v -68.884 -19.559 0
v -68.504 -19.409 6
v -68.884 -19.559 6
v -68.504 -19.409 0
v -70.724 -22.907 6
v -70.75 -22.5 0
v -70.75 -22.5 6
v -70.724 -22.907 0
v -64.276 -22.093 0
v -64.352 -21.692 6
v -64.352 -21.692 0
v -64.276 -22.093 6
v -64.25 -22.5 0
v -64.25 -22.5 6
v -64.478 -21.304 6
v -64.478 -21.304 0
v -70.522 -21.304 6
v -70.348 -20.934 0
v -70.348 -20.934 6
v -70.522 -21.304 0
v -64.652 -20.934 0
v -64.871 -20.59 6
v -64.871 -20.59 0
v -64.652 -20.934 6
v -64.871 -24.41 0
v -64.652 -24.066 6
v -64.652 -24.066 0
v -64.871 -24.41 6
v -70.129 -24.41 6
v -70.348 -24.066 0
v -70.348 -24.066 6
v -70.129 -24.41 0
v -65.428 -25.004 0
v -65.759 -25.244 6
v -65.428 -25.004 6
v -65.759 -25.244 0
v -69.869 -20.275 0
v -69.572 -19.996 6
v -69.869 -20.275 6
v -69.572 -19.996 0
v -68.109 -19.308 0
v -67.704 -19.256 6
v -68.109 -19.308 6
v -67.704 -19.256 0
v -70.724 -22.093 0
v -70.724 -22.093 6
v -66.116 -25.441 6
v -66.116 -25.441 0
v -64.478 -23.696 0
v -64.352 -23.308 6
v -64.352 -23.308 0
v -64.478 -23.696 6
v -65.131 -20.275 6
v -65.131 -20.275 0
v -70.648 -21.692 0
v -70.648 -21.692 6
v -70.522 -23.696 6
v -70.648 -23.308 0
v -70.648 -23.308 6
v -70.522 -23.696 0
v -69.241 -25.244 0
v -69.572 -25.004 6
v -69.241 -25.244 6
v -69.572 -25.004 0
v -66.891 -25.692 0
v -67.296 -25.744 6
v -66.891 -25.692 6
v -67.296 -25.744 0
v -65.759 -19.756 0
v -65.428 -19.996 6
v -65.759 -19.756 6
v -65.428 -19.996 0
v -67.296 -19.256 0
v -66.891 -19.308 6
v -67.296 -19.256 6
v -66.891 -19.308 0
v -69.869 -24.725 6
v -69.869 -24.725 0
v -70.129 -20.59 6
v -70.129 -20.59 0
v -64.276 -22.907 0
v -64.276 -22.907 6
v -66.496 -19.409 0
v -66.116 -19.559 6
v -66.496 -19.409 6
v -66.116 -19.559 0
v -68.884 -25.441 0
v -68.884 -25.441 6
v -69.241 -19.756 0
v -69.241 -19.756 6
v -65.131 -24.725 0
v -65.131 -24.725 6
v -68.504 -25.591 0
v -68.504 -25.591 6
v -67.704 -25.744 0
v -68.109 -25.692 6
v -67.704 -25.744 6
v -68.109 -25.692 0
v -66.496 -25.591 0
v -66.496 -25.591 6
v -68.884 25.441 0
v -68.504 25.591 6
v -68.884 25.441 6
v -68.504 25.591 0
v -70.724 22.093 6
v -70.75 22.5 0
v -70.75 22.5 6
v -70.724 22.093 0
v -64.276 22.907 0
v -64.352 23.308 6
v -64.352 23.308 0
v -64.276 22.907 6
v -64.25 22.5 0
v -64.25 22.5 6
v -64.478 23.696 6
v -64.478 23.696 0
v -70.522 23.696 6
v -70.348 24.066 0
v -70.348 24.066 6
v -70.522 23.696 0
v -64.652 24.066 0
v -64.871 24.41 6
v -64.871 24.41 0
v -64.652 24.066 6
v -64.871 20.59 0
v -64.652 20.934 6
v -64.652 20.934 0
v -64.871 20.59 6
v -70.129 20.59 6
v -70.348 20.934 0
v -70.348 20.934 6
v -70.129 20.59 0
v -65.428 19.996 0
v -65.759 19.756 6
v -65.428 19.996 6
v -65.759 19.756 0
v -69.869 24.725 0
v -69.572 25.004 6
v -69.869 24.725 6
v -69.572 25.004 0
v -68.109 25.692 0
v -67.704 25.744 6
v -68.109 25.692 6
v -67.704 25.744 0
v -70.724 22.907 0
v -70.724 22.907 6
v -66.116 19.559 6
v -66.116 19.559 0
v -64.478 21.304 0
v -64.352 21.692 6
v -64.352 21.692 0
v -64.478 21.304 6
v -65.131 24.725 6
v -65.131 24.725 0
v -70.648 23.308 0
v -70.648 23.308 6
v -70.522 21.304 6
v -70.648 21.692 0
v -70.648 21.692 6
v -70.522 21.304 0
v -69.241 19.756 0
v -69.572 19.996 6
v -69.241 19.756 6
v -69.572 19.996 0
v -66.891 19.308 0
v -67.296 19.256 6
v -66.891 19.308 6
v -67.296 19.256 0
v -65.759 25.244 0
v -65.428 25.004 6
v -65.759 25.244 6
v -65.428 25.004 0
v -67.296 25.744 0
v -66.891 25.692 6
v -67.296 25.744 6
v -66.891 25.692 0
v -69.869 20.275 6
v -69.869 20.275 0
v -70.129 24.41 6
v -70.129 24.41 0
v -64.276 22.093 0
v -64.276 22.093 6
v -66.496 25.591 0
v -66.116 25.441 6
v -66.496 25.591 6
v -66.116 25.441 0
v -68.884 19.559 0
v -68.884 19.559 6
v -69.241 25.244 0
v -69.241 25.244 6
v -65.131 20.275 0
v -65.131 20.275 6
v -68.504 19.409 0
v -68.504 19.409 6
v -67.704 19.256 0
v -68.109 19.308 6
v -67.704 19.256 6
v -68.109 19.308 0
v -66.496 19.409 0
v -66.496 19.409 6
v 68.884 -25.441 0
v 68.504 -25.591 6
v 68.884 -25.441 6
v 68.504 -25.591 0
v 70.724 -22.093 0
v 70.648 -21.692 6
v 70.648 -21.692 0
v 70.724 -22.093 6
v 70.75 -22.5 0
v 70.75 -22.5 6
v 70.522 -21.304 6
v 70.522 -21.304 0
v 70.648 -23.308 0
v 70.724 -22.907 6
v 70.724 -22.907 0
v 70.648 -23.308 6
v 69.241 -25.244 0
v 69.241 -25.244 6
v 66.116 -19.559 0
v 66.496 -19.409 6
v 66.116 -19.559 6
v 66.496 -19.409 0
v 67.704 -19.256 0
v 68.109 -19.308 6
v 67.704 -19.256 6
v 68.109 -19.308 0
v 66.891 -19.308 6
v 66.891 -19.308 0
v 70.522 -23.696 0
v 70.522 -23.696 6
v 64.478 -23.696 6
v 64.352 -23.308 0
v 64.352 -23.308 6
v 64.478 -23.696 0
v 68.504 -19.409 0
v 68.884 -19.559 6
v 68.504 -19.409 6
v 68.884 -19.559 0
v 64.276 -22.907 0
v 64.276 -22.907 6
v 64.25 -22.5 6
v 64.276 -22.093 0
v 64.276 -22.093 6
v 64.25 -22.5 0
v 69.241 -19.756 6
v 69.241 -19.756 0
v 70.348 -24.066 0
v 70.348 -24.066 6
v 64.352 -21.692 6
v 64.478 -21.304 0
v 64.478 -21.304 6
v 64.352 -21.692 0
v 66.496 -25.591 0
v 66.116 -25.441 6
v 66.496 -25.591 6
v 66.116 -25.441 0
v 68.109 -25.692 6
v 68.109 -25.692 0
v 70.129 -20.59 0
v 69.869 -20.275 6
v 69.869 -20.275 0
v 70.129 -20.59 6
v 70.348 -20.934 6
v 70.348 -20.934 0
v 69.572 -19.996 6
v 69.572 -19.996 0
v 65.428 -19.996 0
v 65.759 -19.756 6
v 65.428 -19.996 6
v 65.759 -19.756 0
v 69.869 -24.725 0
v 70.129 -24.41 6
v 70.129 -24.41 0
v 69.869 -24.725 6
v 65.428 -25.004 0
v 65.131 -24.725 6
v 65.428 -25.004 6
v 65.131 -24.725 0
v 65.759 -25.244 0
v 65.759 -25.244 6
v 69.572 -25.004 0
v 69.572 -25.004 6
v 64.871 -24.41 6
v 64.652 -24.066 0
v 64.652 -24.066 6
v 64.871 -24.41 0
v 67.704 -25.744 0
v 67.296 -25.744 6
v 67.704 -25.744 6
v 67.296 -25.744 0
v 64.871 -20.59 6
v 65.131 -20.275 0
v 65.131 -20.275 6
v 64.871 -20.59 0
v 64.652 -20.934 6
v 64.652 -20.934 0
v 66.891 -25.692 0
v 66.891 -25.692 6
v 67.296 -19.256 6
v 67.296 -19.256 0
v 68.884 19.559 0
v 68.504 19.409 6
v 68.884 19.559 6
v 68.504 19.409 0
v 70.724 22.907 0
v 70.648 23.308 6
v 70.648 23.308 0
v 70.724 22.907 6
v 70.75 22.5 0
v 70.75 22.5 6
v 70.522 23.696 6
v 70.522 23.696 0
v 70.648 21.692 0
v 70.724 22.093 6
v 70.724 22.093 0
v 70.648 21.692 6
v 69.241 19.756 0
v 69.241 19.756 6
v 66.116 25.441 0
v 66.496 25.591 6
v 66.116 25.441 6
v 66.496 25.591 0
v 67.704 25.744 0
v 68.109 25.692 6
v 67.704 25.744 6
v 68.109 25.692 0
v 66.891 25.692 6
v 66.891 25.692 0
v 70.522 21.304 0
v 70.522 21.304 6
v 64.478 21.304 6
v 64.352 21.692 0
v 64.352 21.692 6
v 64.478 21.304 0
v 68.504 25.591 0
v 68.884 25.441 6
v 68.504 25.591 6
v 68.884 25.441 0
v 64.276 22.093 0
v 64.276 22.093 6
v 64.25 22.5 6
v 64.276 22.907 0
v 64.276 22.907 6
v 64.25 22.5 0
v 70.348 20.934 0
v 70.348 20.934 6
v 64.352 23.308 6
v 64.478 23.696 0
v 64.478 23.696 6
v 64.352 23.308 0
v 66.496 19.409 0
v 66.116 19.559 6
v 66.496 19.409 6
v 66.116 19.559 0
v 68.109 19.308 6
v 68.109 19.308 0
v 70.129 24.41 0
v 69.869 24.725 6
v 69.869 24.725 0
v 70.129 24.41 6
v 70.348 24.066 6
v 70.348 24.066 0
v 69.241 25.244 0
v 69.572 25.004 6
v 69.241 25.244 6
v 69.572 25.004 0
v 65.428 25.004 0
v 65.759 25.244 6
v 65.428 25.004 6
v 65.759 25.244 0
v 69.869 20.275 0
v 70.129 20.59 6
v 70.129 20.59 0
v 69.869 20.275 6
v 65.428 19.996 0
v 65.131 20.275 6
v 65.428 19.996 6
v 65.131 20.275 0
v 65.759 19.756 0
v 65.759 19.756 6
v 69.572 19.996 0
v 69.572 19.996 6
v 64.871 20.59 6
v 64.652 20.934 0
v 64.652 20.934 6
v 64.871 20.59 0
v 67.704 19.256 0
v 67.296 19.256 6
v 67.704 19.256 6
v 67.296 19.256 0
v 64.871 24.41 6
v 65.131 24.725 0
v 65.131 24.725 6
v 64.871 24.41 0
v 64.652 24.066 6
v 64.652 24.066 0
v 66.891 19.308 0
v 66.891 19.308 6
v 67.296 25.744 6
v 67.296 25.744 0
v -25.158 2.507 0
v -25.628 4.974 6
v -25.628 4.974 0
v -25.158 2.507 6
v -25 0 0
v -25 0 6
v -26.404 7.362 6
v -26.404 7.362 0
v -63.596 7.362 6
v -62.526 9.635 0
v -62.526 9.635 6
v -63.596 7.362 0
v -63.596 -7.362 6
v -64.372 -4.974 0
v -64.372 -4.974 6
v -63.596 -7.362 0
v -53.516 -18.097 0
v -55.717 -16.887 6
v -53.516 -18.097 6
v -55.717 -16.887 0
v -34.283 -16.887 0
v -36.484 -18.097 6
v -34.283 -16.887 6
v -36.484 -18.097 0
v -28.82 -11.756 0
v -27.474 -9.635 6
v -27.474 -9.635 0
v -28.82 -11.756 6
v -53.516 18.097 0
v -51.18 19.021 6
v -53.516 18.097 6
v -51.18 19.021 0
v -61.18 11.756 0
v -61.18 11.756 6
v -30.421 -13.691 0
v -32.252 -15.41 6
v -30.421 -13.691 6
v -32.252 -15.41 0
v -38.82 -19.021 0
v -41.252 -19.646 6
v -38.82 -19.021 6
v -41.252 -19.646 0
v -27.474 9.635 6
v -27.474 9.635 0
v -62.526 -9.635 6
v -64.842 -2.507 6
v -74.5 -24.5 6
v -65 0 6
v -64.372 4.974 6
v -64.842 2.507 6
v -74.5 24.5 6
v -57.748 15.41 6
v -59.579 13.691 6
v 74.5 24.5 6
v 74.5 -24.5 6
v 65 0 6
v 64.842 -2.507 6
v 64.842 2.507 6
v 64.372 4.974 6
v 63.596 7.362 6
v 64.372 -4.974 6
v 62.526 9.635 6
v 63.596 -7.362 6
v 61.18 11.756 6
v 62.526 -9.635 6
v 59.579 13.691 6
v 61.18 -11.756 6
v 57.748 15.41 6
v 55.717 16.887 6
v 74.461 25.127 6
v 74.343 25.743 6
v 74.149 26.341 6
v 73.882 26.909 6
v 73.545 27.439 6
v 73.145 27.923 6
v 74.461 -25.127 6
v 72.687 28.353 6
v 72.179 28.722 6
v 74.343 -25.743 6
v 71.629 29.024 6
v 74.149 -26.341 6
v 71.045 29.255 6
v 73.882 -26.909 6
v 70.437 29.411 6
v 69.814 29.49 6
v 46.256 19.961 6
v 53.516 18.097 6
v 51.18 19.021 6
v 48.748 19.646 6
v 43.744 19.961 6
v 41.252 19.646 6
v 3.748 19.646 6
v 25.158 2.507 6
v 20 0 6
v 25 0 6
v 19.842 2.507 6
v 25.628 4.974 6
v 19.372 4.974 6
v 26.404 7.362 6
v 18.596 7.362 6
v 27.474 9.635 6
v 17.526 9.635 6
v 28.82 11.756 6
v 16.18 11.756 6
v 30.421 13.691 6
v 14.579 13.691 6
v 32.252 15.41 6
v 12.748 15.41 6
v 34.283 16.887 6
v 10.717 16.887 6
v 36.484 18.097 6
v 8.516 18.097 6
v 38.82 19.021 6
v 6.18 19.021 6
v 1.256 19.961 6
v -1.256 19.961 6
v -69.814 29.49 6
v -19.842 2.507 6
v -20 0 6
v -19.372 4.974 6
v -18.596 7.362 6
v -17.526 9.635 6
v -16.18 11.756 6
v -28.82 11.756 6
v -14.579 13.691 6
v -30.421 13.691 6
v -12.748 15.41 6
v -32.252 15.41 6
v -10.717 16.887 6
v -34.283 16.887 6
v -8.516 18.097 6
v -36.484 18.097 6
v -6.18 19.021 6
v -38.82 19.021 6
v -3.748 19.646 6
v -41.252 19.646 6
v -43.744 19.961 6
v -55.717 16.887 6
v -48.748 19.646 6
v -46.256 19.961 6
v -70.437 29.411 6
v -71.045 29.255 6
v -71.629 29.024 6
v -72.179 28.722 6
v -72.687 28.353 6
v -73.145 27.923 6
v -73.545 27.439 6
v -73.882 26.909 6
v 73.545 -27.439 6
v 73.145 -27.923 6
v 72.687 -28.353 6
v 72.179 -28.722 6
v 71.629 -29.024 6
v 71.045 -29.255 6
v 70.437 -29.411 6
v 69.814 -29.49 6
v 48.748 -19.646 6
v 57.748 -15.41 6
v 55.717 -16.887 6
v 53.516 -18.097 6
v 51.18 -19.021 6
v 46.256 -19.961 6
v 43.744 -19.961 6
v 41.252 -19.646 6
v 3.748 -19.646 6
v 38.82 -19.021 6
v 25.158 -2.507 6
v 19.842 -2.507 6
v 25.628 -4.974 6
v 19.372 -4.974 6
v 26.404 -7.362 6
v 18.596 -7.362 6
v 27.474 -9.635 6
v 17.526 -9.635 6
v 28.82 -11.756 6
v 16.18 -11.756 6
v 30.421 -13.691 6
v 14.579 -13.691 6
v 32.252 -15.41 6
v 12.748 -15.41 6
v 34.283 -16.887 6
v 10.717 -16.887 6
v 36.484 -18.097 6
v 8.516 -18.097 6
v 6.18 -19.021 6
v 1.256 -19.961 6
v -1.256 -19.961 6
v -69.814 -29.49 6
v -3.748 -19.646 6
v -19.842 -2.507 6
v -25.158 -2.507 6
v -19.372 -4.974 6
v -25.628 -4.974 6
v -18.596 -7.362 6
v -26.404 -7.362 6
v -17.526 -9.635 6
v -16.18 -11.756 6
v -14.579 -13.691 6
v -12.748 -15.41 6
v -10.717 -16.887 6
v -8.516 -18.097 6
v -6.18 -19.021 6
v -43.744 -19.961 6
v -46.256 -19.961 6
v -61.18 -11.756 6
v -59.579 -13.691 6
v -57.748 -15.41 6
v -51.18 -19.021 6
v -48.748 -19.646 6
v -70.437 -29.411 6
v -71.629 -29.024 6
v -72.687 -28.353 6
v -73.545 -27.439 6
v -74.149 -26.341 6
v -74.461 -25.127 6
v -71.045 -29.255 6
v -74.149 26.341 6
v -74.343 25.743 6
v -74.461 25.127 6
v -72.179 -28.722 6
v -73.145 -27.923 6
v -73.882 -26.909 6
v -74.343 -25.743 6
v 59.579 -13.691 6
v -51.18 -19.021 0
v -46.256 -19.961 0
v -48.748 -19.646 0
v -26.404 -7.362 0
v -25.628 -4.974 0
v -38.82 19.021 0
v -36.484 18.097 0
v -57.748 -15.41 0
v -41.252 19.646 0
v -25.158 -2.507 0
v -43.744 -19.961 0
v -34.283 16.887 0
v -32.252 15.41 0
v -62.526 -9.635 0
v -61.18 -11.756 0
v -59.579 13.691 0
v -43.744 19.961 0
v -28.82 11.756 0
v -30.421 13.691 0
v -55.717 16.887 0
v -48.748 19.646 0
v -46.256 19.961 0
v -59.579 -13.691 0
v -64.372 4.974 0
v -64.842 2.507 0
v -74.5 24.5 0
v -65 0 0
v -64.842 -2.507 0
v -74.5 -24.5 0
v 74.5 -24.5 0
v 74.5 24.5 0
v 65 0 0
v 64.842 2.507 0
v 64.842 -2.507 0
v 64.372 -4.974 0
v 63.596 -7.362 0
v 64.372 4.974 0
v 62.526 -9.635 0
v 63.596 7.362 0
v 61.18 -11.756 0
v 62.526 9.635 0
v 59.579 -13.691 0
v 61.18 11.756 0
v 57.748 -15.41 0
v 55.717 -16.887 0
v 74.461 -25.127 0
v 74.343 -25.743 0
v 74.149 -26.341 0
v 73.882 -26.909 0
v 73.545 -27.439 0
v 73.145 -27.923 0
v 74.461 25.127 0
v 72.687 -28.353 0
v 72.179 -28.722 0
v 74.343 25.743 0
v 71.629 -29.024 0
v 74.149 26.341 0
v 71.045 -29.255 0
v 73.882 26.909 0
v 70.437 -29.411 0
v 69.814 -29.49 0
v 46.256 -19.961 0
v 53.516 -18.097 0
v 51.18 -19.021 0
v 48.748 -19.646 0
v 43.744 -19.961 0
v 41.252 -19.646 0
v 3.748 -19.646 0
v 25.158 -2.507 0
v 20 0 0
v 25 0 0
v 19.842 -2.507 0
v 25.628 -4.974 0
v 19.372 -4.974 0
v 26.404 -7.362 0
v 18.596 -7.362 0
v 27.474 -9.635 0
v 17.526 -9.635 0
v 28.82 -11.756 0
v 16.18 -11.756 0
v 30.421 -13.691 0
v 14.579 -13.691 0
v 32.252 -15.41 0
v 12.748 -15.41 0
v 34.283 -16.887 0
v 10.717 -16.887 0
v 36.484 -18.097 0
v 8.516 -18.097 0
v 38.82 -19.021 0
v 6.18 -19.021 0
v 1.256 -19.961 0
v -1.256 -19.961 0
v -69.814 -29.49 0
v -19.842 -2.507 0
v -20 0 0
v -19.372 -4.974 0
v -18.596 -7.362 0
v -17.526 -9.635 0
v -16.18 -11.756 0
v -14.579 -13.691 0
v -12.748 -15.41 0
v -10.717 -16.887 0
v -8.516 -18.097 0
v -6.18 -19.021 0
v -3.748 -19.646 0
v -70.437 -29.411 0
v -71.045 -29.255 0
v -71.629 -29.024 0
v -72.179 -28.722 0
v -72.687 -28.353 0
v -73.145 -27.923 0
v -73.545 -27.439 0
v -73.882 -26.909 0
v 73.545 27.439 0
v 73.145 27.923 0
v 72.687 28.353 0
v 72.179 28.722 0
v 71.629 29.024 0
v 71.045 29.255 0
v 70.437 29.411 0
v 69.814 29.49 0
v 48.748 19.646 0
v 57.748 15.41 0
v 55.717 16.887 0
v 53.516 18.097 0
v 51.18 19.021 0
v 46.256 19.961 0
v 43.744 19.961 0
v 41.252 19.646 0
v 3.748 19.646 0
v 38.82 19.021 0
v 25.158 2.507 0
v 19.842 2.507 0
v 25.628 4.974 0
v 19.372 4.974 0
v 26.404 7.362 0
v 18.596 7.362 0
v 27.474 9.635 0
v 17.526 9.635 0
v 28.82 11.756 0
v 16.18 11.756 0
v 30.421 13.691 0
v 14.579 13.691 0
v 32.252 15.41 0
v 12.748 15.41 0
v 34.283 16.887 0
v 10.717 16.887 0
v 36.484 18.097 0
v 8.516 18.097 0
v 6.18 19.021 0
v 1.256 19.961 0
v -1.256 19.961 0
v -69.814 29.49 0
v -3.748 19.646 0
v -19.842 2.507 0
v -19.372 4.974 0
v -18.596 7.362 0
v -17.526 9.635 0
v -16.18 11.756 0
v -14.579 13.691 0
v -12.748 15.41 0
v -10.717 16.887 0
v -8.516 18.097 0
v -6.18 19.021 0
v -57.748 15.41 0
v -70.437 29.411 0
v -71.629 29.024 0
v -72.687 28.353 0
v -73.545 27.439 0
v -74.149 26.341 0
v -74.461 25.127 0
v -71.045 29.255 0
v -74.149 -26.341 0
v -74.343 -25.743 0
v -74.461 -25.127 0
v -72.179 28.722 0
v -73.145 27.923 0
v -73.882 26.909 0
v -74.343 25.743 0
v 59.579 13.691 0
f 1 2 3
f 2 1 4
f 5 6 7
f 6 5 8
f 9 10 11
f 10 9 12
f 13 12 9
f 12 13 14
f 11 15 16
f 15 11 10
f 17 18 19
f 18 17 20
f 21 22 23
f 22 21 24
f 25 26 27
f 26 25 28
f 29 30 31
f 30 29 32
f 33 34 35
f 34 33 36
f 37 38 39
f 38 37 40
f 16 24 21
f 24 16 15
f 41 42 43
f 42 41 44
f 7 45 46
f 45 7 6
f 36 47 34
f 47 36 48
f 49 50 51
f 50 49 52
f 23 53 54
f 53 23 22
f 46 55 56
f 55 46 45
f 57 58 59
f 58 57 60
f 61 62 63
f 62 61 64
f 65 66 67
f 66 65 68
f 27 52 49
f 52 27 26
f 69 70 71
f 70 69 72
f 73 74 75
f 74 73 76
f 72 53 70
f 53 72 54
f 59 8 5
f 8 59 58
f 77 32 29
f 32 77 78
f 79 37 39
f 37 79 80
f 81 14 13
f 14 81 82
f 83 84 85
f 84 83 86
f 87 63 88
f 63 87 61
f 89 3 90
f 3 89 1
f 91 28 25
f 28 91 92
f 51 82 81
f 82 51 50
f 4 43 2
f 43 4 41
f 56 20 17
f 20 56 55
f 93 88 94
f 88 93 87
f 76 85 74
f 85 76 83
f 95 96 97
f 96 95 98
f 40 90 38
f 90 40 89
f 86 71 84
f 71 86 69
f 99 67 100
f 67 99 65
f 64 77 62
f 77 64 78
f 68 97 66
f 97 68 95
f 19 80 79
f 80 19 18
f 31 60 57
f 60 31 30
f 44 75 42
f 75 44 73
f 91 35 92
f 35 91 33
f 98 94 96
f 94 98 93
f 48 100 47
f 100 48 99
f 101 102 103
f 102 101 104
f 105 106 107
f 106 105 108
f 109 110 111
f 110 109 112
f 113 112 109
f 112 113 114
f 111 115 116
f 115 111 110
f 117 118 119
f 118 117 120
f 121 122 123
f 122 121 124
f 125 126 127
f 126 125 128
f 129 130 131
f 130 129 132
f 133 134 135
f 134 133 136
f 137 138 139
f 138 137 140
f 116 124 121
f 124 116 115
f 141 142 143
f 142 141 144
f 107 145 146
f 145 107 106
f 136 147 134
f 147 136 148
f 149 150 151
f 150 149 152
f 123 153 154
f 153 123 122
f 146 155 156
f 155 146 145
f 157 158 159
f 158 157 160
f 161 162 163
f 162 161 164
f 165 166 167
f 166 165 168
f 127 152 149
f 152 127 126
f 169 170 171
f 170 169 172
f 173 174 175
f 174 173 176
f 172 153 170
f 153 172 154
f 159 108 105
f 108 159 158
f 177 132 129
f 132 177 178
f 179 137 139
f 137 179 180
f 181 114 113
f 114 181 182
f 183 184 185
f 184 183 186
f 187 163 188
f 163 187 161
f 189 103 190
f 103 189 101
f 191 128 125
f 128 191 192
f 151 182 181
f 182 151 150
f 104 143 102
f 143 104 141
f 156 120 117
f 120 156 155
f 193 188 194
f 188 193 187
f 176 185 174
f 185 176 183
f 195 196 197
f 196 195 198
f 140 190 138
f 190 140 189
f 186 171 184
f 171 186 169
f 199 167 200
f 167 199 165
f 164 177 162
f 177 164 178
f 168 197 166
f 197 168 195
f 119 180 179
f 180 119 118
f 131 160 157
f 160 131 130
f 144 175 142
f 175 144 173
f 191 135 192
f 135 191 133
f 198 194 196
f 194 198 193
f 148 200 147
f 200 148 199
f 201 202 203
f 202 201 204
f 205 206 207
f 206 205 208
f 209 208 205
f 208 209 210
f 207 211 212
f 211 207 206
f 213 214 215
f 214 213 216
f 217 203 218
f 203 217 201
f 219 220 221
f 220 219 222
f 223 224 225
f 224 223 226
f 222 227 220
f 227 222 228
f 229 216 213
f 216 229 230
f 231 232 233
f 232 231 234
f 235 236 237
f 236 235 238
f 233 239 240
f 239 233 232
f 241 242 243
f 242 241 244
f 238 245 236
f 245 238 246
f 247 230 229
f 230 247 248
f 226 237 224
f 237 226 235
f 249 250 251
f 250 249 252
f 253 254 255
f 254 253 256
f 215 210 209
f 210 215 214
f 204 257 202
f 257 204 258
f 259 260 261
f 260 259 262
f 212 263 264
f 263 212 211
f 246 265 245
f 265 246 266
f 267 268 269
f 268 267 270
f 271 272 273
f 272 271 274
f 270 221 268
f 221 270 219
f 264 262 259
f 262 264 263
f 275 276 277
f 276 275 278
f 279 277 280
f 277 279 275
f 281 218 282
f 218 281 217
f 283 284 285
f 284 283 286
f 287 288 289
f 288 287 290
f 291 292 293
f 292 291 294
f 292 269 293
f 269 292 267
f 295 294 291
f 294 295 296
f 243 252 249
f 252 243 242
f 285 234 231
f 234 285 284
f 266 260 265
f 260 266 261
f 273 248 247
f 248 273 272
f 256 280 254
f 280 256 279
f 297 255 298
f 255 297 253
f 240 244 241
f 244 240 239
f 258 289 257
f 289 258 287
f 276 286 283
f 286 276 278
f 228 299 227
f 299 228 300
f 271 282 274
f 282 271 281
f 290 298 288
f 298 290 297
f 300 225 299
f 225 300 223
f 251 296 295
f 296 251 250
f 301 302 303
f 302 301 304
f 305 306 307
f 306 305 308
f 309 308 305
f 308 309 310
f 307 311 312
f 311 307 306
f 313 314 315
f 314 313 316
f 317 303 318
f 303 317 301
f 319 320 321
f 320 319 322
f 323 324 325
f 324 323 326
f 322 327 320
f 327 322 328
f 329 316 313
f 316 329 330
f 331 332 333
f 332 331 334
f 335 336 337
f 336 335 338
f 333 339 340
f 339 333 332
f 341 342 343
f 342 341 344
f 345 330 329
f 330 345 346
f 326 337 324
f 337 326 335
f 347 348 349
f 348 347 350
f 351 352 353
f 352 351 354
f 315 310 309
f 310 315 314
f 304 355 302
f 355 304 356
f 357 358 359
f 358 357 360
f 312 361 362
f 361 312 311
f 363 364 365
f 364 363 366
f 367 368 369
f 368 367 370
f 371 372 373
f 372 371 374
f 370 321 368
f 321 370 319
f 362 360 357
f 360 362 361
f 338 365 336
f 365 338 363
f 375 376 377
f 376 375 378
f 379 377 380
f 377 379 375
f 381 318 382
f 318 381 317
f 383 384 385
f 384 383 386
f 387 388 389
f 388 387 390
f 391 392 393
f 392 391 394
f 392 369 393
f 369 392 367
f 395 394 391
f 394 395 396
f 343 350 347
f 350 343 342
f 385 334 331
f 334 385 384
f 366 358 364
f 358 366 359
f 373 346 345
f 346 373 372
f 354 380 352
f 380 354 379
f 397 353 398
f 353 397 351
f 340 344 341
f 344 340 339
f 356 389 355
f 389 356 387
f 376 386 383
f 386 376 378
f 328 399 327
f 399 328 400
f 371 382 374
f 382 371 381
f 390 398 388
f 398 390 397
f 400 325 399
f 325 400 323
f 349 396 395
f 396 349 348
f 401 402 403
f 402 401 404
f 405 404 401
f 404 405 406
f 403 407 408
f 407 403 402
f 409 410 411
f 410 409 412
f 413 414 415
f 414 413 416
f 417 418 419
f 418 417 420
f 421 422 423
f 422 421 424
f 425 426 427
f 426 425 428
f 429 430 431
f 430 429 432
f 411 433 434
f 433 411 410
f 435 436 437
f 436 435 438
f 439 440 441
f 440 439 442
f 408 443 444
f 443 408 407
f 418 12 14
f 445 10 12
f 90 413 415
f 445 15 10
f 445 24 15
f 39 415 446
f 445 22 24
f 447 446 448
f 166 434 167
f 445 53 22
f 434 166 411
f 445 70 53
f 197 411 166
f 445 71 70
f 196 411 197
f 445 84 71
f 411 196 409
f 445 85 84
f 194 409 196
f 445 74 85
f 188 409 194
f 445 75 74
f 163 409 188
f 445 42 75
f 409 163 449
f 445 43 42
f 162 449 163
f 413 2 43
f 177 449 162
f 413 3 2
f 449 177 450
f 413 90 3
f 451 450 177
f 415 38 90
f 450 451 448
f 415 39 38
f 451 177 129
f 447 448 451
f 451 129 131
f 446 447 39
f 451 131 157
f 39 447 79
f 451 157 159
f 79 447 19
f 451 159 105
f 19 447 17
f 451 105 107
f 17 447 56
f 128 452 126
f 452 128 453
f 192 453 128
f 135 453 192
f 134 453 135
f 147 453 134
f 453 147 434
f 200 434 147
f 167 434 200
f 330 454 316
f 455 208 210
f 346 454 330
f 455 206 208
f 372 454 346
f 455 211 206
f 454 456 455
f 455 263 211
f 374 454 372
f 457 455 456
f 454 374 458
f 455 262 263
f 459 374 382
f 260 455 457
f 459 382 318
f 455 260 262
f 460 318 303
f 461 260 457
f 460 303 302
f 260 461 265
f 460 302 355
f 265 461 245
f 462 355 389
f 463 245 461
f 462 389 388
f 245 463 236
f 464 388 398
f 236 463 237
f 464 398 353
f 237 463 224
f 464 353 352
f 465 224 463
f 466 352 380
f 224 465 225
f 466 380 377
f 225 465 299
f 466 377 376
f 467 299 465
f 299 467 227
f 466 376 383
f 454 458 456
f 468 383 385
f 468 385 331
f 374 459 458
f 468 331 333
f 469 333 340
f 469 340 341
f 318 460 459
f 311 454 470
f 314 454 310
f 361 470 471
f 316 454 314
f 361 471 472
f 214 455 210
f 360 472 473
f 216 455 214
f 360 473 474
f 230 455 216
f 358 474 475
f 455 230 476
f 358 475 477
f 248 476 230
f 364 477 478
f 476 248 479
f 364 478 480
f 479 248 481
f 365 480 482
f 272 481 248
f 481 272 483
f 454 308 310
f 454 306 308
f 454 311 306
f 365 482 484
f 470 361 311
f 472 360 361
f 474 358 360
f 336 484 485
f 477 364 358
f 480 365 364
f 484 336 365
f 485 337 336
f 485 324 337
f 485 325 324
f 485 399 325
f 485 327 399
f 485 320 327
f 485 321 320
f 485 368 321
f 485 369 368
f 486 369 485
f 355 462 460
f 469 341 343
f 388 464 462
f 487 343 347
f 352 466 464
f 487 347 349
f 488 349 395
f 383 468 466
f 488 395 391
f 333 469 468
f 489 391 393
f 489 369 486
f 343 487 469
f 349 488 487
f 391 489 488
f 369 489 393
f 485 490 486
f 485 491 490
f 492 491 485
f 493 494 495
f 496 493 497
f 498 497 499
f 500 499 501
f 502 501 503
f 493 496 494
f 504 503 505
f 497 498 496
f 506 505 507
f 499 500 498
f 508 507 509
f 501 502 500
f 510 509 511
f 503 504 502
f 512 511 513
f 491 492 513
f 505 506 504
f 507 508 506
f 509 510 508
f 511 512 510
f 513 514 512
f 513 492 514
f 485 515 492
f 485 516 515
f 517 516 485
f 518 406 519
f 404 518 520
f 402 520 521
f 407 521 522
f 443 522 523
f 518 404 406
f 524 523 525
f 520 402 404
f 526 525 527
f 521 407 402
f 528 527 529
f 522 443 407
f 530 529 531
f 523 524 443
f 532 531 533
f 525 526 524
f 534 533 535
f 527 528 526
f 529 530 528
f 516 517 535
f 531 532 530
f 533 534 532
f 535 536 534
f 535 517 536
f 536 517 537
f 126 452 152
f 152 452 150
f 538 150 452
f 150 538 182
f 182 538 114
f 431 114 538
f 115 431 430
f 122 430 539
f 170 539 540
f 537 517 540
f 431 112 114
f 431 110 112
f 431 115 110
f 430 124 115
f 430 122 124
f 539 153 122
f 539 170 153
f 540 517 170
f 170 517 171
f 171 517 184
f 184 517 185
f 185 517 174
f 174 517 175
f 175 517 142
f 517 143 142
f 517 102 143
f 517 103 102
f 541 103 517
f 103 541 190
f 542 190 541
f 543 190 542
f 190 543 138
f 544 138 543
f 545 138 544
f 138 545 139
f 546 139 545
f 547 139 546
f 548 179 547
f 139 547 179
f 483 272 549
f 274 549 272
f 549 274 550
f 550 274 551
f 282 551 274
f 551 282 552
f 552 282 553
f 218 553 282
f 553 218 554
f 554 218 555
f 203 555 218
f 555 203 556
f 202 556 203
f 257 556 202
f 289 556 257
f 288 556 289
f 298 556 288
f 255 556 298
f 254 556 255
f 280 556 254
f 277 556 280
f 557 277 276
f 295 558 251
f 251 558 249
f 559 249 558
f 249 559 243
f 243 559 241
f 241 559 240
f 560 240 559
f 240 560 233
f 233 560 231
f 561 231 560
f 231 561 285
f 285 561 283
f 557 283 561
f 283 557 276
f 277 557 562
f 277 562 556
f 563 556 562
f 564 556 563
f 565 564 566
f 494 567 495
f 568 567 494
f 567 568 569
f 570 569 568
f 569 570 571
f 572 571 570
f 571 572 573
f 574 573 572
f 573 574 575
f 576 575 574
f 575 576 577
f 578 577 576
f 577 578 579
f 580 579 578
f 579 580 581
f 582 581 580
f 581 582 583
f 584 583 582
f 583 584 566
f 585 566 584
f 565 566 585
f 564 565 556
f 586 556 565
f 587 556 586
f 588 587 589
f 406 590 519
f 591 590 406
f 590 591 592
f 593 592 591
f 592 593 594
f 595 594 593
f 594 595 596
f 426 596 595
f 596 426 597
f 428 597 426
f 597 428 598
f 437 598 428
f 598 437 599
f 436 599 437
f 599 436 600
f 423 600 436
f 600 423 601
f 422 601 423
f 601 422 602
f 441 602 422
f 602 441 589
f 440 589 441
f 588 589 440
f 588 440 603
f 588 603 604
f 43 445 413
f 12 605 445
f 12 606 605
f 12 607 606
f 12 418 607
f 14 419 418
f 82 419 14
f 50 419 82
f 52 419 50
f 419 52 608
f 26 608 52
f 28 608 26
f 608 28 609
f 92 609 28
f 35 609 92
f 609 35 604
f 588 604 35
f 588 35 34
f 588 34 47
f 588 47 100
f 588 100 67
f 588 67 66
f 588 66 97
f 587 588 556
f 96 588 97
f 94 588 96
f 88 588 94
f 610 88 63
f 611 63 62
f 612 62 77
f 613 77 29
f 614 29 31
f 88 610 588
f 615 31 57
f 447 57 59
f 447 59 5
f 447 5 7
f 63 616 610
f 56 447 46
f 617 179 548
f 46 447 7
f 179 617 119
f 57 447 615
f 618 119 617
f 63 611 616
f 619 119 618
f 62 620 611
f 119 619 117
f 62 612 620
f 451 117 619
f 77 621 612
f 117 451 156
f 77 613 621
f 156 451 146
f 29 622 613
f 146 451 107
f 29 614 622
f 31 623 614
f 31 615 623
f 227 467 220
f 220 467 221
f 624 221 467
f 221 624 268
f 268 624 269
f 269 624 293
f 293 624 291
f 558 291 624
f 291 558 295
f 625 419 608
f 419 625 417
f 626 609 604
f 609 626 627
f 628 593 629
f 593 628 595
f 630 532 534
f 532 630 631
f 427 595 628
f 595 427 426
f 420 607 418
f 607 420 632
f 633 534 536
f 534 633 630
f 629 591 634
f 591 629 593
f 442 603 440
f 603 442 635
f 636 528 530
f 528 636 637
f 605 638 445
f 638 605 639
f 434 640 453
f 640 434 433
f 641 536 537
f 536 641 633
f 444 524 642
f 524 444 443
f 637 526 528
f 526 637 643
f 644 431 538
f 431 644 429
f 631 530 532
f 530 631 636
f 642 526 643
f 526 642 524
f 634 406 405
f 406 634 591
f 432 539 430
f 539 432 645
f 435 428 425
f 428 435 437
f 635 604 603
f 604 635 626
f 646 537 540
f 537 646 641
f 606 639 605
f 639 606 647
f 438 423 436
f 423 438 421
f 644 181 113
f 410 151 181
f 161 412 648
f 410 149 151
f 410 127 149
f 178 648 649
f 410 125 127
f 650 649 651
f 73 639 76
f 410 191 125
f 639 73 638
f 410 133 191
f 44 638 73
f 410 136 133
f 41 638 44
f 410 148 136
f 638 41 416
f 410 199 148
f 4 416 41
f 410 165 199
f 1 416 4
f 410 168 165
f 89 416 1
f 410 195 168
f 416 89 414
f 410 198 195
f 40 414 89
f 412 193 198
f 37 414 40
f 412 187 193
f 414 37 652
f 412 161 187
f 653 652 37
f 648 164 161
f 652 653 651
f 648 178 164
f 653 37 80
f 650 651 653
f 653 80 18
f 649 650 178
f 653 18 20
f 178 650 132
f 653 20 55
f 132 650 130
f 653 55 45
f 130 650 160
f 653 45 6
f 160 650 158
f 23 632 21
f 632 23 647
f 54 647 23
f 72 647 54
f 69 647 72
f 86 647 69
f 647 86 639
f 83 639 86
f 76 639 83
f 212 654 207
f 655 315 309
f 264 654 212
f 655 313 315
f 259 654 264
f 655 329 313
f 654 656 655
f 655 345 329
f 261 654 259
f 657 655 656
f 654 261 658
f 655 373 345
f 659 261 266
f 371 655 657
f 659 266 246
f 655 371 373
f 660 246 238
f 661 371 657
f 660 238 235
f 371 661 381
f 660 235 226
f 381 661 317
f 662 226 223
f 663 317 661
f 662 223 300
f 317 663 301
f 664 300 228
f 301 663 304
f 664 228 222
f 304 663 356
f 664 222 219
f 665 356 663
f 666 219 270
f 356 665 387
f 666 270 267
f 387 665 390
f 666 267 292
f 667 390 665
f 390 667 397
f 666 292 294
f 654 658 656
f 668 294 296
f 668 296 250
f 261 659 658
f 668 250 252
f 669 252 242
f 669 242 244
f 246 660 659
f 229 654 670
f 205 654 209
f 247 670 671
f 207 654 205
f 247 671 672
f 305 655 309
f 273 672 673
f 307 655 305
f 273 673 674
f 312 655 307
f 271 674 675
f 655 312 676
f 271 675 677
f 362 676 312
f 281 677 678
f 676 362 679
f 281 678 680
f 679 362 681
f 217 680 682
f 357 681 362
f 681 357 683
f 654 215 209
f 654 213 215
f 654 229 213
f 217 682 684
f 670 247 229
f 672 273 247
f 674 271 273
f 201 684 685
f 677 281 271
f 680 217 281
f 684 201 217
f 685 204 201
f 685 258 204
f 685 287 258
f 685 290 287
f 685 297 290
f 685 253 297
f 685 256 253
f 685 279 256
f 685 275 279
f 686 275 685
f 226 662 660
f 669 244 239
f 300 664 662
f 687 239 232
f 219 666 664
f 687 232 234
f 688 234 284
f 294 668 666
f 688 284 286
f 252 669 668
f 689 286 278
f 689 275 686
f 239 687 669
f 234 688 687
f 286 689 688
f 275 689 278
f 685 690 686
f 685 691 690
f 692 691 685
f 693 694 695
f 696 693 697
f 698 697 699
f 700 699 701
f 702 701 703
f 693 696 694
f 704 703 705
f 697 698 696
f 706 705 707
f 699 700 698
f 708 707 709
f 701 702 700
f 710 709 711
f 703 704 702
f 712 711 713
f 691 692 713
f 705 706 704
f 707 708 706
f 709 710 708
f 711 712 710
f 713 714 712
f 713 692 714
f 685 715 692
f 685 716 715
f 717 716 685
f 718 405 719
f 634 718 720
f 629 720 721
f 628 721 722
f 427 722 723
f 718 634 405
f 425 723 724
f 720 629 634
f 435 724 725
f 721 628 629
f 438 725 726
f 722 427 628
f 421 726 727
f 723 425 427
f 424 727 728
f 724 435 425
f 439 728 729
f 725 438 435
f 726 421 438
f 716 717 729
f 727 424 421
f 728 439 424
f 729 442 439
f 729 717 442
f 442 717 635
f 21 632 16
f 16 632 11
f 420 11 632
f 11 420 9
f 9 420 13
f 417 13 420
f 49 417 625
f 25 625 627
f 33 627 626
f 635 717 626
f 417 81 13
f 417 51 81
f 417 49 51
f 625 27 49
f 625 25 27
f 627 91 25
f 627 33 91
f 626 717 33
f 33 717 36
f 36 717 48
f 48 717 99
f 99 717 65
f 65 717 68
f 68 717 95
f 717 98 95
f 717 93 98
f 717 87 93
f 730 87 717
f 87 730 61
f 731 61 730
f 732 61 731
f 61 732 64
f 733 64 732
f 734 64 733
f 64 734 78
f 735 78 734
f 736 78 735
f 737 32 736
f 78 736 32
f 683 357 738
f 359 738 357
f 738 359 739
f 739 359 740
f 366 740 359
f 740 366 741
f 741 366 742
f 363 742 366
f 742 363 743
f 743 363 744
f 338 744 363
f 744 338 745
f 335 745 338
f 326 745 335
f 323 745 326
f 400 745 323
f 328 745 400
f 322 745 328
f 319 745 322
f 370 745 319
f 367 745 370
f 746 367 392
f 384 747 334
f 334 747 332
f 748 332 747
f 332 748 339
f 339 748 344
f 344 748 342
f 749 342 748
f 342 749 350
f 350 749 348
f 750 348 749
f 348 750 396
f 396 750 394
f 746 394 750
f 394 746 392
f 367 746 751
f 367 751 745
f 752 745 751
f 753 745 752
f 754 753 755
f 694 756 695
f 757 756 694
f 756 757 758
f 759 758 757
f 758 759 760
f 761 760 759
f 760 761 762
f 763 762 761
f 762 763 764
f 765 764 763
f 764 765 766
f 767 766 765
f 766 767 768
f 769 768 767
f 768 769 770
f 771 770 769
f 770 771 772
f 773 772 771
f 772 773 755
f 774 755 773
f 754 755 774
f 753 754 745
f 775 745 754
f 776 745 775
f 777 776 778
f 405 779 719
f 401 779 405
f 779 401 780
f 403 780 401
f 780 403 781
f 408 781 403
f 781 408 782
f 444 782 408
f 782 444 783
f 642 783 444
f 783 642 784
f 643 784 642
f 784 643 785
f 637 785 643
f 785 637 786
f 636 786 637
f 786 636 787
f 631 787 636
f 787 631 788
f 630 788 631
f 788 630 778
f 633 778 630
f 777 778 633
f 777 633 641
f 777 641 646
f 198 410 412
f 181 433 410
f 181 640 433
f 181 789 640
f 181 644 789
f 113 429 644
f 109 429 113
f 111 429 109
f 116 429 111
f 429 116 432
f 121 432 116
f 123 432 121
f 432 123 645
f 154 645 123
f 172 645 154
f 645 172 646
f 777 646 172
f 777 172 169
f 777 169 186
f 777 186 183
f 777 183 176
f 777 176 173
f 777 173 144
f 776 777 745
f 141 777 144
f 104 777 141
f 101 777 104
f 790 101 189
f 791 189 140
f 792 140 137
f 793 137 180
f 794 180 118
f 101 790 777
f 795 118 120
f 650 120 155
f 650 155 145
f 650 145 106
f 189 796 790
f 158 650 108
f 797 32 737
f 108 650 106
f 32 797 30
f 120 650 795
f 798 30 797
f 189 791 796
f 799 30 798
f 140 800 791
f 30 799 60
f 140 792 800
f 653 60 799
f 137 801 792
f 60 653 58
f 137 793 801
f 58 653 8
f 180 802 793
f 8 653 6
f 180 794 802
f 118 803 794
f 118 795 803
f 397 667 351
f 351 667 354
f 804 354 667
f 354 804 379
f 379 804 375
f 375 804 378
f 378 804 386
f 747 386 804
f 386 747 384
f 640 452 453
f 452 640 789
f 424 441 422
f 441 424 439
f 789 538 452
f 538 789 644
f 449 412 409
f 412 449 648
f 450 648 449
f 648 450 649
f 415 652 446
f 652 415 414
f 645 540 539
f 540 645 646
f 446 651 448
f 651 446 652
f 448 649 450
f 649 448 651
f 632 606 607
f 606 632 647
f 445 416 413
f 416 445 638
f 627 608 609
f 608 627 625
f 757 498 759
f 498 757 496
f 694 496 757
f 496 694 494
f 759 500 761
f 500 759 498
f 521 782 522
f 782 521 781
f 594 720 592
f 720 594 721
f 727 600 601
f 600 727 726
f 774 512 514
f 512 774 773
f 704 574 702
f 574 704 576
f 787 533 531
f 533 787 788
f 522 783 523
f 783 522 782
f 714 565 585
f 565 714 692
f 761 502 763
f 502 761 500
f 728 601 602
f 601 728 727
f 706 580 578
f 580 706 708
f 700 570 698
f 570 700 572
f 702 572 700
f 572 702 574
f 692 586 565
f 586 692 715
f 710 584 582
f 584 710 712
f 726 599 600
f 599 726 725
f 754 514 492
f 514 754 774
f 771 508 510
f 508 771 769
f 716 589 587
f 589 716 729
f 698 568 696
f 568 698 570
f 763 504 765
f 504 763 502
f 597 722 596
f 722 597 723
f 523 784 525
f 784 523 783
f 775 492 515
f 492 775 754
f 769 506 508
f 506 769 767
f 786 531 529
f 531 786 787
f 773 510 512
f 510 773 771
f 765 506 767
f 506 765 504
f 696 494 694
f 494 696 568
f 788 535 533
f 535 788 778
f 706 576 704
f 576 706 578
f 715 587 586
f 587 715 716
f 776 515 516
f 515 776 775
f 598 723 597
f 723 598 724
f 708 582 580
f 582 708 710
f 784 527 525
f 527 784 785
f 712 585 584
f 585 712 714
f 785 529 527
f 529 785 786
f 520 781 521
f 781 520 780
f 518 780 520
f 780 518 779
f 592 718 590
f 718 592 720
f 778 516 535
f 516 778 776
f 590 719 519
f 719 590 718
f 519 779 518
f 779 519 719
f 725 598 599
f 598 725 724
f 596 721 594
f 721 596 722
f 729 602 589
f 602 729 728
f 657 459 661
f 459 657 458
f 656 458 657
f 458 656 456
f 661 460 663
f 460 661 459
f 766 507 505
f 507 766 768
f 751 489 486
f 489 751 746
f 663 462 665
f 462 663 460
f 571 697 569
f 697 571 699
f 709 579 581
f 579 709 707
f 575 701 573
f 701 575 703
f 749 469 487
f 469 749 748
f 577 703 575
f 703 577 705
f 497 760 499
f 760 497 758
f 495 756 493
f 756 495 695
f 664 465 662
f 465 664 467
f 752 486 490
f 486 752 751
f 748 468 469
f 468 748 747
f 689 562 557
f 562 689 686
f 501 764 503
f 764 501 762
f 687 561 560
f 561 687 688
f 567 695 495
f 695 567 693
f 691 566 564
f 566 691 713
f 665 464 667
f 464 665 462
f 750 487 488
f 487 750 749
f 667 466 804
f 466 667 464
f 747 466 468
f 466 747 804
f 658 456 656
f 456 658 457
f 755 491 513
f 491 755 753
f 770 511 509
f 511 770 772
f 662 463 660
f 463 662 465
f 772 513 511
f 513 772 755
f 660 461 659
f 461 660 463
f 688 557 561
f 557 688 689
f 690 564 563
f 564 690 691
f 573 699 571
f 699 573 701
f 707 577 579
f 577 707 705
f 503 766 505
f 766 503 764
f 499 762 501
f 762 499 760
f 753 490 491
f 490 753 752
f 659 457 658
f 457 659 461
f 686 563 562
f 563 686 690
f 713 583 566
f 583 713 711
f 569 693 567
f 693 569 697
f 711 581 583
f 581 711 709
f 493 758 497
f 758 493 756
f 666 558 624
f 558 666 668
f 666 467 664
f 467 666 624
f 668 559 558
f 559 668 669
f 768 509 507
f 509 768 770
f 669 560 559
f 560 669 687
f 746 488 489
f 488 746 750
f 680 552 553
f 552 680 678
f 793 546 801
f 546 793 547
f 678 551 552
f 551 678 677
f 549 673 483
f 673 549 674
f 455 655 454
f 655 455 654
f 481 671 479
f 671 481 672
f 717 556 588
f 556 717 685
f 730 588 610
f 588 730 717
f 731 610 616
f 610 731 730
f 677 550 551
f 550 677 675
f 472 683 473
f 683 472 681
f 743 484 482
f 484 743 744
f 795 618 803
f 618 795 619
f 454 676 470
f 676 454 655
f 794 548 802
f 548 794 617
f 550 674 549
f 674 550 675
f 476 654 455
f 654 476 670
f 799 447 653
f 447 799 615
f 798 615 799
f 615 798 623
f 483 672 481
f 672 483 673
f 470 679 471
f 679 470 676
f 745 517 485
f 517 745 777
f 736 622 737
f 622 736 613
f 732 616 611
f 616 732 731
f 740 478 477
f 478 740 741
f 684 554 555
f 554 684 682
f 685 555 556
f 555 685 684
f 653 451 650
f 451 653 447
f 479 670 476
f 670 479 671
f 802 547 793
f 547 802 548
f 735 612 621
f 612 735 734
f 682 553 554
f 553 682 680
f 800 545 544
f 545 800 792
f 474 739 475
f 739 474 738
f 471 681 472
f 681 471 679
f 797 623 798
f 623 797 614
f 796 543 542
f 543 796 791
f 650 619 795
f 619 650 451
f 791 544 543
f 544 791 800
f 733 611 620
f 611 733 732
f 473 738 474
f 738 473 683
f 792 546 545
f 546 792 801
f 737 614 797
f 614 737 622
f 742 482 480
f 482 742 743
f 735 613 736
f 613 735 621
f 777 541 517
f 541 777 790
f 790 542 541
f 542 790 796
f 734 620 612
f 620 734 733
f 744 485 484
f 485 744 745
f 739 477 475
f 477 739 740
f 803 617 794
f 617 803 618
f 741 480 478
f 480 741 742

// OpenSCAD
$fn = 50;

difference() {
	union() {
		hull() {
			translate(v = [-69.5, 24.5, 0]) {
				cylinder(h = 6, r = 5);
			}
			translate(v = [69.5, 24.5, 0]) {
				cylinder(h = 6, r = 5);
			}
			translate(v = [-69.5, -24.5, 0]) {
				cylinder(h = 6, r = 5);
			}
			translate(v = [69.5, -24.5, 0]) {
				cylinder(h = 6, r = 5);
			}
		}
	}
	union() {
		translate(v = [-67.5, -22.5, -100.0]) {
			cylinder(h = 200, r = 3.25);
		}
		translate(v = [-67.5, 22.5, -100.0]) {
			cylinder(h = 200, r = 3.25);
		}
		translate(v = [67.5, -22.5, -100.0]) {
			cylinder(h = 200, r = 3.25);
		}
		translate(v = [67.5, 22.5, -100.0]) {
			cylinder(h = 200, r = 3.25);
		}
		translate(v = [-67.5, -22.5, -100.0]) {
			cylinder(h = 200, r = 1.8);
		}
		translate(v = [-67.5, 22.5, -100.0]) {
			cylinder(h = 200, r = 1.8);
		}
		translate(v = [67.5, -22.5, -100.0]) {
			cylinder(h = 200, r = 1.8);
		}
		translate(v = [67.5, 22.5, -100.0]) {
			cylinder(h = 200, r = 1.8);
		}
		translate(v = [-45.0, 0, 0.0]) {
			cylinder(h = 6, r = 20.0);
		}
		cylinder(h = 6, r = 20.0);
		translate(v = [45.0, 0, 0.0]) {
			cylinder(h = 6, r = 20.0);
		}
	}
}
